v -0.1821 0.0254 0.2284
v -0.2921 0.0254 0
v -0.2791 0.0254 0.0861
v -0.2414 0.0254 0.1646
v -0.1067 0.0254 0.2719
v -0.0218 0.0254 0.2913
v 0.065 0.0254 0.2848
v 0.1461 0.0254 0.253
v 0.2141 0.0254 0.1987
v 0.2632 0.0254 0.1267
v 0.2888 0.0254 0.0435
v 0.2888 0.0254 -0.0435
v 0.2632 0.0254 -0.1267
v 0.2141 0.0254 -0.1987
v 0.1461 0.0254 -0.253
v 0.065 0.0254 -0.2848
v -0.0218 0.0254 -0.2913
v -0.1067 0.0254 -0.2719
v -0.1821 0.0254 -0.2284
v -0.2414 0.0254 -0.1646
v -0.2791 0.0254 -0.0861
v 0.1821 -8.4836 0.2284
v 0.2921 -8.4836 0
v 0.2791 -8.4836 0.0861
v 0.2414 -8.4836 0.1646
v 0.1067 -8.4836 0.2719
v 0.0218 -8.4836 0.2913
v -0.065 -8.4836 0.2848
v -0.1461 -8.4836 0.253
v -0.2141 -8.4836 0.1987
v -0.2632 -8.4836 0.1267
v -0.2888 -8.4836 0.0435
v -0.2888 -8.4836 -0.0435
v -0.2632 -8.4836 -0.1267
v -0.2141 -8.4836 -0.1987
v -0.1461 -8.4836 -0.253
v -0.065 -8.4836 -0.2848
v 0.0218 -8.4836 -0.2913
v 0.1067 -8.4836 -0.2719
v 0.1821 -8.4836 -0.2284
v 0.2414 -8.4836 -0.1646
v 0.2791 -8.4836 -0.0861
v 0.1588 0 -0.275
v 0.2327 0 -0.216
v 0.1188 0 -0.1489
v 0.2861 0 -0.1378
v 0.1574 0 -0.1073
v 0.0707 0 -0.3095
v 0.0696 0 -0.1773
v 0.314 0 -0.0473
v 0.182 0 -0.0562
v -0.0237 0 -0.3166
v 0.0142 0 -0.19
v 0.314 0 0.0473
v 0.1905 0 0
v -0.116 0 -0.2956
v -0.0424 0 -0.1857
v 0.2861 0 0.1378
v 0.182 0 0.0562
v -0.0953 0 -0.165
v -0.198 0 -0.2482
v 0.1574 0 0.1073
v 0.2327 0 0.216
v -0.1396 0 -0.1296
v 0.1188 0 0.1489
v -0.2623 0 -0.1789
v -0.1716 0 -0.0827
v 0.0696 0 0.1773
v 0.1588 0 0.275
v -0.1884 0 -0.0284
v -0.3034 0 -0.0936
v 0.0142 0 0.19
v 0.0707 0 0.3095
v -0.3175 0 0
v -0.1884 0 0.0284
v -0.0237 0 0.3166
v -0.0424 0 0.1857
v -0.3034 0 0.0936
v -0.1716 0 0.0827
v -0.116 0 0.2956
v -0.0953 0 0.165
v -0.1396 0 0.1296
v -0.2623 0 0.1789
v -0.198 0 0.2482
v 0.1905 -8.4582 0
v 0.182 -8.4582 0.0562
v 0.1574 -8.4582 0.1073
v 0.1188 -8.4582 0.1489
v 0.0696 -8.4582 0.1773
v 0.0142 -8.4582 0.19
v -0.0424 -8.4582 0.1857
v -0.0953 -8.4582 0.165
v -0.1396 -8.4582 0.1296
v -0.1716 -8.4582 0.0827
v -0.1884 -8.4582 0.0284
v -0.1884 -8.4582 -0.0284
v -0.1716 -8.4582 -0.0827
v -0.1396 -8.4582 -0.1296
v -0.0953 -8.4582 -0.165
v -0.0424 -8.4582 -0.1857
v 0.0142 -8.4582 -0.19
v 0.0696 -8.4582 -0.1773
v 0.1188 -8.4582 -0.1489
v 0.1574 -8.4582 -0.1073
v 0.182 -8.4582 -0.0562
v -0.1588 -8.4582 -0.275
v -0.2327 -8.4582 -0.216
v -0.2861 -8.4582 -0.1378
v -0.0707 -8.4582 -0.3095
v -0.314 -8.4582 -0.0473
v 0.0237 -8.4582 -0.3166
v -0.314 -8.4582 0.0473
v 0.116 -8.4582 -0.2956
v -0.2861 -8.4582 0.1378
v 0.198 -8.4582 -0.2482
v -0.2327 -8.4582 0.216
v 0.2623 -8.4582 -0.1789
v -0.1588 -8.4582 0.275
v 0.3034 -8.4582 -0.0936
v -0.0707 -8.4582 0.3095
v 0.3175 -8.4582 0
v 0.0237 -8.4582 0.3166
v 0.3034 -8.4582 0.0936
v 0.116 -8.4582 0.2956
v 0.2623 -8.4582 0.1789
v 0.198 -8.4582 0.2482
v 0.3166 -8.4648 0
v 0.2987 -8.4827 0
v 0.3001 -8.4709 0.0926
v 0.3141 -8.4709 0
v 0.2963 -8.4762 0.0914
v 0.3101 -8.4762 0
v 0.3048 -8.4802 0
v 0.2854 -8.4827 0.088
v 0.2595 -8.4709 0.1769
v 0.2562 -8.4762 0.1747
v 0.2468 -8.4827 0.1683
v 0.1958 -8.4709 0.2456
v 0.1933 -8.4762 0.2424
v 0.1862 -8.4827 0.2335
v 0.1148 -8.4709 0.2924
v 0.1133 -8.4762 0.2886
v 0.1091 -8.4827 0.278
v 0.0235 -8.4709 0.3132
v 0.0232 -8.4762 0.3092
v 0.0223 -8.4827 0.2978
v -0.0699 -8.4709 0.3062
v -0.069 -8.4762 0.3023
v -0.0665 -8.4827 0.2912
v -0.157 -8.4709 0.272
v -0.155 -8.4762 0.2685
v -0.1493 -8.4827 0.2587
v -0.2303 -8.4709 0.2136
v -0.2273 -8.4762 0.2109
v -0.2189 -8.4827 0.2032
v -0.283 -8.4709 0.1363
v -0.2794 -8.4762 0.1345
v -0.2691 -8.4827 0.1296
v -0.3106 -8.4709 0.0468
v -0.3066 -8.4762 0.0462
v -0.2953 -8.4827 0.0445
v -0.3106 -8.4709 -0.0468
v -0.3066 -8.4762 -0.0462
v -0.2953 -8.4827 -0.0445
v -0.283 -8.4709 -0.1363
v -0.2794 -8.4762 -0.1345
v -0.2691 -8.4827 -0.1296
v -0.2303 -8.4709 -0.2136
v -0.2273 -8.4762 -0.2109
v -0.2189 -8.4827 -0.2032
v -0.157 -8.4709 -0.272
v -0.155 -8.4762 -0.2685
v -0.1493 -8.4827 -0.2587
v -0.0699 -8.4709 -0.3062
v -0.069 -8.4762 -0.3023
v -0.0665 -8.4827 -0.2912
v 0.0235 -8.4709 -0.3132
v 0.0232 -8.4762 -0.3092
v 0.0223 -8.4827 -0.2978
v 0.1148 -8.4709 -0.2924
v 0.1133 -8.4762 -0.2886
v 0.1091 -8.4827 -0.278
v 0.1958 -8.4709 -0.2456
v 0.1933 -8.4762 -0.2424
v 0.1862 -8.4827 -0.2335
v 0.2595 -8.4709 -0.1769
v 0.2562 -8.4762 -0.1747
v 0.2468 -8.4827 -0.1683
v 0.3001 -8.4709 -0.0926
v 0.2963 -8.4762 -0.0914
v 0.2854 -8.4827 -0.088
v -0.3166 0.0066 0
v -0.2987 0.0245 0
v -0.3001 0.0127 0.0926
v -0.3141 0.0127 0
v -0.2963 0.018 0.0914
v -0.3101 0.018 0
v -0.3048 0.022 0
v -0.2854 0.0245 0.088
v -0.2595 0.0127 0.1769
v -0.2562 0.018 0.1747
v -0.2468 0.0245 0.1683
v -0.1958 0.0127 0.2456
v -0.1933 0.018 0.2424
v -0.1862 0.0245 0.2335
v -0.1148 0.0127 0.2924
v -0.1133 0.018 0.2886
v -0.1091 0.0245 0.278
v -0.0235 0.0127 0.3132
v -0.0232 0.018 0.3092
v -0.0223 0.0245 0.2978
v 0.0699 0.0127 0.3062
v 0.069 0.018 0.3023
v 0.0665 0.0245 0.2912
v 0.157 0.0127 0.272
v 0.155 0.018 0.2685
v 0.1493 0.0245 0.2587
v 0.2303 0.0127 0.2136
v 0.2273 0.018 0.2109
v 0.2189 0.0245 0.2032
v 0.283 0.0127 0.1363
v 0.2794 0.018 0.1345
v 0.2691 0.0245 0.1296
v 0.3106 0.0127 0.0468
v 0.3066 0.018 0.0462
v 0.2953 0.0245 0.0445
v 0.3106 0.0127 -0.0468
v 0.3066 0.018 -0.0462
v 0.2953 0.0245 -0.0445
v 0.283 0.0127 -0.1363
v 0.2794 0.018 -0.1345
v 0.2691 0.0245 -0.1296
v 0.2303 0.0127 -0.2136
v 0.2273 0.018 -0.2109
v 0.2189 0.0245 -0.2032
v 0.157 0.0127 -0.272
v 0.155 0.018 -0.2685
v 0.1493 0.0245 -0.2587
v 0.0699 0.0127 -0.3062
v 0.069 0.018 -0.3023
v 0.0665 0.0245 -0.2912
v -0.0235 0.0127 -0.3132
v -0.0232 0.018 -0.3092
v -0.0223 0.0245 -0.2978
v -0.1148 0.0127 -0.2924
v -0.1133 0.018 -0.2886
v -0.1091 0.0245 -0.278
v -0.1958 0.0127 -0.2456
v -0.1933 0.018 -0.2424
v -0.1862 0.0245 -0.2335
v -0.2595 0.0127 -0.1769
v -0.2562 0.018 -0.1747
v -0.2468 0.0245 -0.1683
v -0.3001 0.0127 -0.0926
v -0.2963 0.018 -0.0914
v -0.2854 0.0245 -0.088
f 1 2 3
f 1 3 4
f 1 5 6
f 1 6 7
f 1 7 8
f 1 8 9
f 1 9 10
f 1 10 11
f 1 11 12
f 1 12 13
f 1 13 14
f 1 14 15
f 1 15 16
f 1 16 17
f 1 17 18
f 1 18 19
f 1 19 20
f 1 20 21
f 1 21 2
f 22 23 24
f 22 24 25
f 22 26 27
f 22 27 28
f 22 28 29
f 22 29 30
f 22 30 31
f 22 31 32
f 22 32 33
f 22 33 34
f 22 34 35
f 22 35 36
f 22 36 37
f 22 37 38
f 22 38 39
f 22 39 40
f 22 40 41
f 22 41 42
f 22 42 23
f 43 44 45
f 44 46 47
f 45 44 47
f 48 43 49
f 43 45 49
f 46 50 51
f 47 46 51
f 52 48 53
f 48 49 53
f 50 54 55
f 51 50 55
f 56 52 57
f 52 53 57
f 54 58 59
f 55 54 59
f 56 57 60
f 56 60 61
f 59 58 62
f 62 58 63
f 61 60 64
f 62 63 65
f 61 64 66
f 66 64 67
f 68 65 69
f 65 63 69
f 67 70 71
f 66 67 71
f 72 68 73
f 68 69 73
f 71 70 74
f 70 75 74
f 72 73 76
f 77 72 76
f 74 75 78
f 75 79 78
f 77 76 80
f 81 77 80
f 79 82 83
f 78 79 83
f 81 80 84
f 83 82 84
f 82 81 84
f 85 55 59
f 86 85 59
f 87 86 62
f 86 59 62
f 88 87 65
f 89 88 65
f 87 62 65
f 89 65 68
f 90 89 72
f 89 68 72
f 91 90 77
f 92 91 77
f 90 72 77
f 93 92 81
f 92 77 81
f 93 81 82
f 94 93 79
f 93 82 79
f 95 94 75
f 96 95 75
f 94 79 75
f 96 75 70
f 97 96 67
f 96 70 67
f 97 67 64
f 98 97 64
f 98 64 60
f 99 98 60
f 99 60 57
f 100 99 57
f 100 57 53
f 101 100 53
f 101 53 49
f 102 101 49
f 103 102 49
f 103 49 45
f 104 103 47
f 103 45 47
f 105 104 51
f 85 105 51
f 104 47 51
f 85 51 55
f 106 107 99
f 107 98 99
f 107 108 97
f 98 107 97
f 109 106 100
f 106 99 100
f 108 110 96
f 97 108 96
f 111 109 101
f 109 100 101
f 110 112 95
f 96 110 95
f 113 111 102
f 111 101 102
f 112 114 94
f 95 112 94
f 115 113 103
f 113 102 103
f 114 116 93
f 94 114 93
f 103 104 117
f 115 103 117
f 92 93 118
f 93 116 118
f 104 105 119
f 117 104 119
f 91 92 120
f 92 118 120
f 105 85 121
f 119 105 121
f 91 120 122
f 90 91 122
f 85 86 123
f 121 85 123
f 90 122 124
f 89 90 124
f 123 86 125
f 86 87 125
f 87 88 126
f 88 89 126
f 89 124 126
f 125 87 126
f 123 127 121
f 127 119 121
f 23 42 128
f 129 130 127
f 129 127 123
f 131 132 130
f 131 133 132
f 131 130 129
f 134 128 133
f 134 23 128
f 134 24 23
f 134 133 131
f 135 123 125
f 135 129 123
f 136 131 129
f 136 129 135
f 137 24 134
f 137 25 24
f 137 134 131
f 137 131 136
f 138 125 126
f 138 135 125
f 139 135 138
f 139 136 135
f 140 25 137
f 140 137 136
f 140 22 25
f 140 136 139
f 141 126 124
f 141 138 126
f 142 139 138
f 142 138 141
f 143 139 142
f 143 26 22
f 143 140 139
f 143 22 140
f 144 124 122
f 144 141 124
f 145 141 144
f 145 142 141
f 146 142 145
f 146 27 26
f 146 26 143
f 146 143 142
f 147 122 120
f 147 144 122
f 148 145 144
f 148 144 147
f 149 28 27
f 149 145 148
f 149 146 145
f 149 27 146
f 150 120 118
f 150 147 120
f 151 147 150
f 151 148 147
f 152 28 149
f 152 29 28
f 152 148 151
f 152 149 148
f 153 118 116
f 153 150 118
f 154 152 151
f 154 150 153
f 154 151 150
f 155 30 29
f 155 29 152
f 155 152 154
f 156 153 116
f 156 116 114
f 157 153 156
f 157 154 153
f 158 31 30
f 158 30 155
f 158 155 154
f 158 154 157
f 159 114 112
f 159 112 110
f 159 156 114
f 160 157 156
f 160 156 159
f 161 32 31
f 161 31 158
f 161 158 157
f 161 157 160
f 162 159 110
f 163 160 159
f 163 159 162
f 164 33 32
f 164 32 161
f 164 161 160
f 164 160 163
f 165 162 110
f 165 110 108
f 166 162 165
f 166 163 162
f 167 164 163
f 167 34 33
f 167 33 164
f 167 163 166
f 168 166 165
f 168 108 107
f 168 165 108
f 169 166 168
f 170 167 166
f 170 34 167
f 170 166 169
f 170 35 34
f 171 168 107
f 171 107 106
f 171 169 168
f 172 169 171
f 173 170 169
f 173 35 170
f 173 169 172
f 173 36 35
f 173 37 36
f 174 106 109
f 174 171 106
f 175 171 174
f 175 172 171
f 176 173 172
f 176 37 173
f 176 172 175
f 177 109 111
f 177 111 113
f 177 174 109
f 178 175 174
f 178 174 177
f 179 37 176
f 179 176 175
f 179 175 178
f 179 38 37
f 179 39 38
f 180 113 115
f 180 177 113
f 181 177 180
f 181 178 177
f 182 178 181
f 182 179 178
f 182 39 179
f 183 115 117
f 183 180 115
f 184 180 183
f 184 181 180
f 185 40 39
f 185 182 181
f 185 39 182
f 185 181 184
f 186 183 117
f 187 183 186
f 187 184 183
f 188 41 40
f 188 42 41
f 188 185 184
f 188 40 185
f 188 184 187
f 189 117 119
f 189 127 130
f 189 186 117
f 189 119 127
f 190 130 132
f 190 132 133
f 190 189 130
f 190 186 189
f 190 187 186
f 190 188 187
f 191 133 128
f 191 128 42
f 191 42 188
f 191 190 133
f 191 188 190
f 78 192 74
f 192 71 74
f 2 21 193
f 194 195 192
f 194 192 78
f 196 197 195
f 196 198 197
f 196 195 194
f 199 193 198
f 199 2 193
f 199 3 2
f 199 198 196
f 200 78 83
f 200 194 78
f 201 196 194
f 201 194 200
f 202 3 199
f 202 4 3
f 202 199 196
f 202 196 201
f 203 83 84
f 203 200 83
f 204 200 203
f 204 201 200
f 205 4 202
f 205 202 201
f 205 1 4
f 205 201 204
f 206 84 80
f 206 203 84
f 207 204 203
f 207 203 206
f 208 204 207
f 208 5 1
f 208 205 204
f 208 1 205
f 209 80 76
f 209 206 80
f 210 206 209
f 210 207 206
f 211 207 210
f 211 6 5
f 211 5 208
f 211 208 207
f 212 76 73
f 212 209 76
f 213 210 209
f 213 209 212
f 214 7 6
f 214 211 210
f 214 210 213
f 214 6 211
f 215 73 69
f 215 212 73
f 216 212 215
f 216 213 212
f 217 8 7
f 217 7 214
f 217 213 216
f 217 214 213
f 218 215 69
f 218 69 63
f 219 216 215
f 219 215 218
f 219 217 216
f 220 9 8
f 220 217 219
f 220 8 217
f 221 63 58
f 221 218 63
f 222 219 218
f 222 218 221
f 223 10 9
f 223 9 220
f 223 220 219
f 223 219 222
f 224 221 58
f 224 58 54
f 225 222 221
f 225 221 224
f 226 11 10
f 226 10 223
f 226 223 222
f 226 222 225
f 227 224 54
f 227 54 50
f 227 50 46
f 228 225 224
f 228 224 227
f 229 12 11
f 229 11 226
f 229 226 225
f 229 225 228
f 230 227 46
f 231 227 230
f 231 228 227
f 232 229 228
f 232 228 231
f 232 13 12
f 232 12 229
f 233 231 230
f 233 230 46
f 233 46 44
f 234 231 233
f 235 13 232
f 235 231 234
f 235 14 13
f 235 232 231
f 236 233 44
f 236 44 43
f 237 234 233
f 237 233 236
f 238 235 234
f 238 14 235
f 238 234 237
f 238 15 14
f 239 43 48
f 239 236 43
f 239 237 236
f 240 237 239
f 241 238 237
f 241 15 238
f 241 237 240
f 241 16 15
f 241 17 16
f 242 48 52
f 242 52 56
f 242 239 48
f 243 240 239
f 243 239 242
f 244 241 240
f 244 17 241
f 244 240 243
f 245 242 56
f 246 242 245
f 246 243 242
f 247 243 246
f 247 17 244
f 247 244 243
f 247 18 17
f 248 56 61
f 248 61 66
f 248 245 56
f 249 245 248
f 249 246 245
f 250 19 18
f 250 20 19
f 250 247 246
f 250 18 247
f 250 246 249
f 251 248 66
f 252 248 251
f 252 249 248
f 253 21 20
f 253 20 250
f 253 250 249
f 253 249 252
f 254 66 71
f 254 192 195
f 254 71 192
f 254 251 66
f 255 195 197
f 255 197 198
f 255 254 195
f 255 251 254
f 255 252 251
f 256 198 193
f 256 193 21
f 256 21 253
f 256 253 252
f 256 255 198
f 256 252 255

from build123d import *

# Parameters (mm, degrees)
F0_R     = 0.1905
F1_DEPTH = 8.4582
F2_R     = 0.3175
F3_DEPTH = 0.0254
F4_R     = 0.3175
F5_DEPTH = 0.0254
F6_R     = 0.02539
F7_R     = 0.02539


# Not quite as in the source:
# - a fillet or chamfer is up to 0.001 mm smaller than in the source, because OpenCascade refuses the exact size


with BuildPart() as f1:
    # F0 (on Front) → F1 (new body)
    with BuildSketch(Plane.XZ):
        Circle(F0_R)
    extrude(amount=F1_DEPTH)

    # F2 (on face) → F3 (join)
    with BuildSketch(Plane.XZ.offset(8.4582)):
        Circle(F2_R)
    extrude(amount=F3_DEPTH)

    # F4 (on face) → F5 (join)
    with BuildSketch(Plane(origin=(0, 0, 0), x_dir=(-1, 0, 0), z_dir=(0, 1, 0))):
        Circle(F4_R)
    extrude(amount=F5_DEPTH)

    # F6 (radius 0.0254 in the source; OpenCascade refuses exactly that, so slightly less here)
    f6_edges = [f1.edges().sort_by_distance(p)[0] for p in [
        (0.3175, 0.0254, 0),
    ]]
    fillet(f6_edges, radius=F6_R)

    # F7 (radius 0.0254 in the source; OpenCascade refuses exactly that, so slightly less here)
    f7_edges = [f1.edges().sort_by_distance(p)[0] for p in [
        (-0.3175, -8.4836, 0),
    ]]
    fillet(f7_edges, radius=F7_R)


solid = f1.part
